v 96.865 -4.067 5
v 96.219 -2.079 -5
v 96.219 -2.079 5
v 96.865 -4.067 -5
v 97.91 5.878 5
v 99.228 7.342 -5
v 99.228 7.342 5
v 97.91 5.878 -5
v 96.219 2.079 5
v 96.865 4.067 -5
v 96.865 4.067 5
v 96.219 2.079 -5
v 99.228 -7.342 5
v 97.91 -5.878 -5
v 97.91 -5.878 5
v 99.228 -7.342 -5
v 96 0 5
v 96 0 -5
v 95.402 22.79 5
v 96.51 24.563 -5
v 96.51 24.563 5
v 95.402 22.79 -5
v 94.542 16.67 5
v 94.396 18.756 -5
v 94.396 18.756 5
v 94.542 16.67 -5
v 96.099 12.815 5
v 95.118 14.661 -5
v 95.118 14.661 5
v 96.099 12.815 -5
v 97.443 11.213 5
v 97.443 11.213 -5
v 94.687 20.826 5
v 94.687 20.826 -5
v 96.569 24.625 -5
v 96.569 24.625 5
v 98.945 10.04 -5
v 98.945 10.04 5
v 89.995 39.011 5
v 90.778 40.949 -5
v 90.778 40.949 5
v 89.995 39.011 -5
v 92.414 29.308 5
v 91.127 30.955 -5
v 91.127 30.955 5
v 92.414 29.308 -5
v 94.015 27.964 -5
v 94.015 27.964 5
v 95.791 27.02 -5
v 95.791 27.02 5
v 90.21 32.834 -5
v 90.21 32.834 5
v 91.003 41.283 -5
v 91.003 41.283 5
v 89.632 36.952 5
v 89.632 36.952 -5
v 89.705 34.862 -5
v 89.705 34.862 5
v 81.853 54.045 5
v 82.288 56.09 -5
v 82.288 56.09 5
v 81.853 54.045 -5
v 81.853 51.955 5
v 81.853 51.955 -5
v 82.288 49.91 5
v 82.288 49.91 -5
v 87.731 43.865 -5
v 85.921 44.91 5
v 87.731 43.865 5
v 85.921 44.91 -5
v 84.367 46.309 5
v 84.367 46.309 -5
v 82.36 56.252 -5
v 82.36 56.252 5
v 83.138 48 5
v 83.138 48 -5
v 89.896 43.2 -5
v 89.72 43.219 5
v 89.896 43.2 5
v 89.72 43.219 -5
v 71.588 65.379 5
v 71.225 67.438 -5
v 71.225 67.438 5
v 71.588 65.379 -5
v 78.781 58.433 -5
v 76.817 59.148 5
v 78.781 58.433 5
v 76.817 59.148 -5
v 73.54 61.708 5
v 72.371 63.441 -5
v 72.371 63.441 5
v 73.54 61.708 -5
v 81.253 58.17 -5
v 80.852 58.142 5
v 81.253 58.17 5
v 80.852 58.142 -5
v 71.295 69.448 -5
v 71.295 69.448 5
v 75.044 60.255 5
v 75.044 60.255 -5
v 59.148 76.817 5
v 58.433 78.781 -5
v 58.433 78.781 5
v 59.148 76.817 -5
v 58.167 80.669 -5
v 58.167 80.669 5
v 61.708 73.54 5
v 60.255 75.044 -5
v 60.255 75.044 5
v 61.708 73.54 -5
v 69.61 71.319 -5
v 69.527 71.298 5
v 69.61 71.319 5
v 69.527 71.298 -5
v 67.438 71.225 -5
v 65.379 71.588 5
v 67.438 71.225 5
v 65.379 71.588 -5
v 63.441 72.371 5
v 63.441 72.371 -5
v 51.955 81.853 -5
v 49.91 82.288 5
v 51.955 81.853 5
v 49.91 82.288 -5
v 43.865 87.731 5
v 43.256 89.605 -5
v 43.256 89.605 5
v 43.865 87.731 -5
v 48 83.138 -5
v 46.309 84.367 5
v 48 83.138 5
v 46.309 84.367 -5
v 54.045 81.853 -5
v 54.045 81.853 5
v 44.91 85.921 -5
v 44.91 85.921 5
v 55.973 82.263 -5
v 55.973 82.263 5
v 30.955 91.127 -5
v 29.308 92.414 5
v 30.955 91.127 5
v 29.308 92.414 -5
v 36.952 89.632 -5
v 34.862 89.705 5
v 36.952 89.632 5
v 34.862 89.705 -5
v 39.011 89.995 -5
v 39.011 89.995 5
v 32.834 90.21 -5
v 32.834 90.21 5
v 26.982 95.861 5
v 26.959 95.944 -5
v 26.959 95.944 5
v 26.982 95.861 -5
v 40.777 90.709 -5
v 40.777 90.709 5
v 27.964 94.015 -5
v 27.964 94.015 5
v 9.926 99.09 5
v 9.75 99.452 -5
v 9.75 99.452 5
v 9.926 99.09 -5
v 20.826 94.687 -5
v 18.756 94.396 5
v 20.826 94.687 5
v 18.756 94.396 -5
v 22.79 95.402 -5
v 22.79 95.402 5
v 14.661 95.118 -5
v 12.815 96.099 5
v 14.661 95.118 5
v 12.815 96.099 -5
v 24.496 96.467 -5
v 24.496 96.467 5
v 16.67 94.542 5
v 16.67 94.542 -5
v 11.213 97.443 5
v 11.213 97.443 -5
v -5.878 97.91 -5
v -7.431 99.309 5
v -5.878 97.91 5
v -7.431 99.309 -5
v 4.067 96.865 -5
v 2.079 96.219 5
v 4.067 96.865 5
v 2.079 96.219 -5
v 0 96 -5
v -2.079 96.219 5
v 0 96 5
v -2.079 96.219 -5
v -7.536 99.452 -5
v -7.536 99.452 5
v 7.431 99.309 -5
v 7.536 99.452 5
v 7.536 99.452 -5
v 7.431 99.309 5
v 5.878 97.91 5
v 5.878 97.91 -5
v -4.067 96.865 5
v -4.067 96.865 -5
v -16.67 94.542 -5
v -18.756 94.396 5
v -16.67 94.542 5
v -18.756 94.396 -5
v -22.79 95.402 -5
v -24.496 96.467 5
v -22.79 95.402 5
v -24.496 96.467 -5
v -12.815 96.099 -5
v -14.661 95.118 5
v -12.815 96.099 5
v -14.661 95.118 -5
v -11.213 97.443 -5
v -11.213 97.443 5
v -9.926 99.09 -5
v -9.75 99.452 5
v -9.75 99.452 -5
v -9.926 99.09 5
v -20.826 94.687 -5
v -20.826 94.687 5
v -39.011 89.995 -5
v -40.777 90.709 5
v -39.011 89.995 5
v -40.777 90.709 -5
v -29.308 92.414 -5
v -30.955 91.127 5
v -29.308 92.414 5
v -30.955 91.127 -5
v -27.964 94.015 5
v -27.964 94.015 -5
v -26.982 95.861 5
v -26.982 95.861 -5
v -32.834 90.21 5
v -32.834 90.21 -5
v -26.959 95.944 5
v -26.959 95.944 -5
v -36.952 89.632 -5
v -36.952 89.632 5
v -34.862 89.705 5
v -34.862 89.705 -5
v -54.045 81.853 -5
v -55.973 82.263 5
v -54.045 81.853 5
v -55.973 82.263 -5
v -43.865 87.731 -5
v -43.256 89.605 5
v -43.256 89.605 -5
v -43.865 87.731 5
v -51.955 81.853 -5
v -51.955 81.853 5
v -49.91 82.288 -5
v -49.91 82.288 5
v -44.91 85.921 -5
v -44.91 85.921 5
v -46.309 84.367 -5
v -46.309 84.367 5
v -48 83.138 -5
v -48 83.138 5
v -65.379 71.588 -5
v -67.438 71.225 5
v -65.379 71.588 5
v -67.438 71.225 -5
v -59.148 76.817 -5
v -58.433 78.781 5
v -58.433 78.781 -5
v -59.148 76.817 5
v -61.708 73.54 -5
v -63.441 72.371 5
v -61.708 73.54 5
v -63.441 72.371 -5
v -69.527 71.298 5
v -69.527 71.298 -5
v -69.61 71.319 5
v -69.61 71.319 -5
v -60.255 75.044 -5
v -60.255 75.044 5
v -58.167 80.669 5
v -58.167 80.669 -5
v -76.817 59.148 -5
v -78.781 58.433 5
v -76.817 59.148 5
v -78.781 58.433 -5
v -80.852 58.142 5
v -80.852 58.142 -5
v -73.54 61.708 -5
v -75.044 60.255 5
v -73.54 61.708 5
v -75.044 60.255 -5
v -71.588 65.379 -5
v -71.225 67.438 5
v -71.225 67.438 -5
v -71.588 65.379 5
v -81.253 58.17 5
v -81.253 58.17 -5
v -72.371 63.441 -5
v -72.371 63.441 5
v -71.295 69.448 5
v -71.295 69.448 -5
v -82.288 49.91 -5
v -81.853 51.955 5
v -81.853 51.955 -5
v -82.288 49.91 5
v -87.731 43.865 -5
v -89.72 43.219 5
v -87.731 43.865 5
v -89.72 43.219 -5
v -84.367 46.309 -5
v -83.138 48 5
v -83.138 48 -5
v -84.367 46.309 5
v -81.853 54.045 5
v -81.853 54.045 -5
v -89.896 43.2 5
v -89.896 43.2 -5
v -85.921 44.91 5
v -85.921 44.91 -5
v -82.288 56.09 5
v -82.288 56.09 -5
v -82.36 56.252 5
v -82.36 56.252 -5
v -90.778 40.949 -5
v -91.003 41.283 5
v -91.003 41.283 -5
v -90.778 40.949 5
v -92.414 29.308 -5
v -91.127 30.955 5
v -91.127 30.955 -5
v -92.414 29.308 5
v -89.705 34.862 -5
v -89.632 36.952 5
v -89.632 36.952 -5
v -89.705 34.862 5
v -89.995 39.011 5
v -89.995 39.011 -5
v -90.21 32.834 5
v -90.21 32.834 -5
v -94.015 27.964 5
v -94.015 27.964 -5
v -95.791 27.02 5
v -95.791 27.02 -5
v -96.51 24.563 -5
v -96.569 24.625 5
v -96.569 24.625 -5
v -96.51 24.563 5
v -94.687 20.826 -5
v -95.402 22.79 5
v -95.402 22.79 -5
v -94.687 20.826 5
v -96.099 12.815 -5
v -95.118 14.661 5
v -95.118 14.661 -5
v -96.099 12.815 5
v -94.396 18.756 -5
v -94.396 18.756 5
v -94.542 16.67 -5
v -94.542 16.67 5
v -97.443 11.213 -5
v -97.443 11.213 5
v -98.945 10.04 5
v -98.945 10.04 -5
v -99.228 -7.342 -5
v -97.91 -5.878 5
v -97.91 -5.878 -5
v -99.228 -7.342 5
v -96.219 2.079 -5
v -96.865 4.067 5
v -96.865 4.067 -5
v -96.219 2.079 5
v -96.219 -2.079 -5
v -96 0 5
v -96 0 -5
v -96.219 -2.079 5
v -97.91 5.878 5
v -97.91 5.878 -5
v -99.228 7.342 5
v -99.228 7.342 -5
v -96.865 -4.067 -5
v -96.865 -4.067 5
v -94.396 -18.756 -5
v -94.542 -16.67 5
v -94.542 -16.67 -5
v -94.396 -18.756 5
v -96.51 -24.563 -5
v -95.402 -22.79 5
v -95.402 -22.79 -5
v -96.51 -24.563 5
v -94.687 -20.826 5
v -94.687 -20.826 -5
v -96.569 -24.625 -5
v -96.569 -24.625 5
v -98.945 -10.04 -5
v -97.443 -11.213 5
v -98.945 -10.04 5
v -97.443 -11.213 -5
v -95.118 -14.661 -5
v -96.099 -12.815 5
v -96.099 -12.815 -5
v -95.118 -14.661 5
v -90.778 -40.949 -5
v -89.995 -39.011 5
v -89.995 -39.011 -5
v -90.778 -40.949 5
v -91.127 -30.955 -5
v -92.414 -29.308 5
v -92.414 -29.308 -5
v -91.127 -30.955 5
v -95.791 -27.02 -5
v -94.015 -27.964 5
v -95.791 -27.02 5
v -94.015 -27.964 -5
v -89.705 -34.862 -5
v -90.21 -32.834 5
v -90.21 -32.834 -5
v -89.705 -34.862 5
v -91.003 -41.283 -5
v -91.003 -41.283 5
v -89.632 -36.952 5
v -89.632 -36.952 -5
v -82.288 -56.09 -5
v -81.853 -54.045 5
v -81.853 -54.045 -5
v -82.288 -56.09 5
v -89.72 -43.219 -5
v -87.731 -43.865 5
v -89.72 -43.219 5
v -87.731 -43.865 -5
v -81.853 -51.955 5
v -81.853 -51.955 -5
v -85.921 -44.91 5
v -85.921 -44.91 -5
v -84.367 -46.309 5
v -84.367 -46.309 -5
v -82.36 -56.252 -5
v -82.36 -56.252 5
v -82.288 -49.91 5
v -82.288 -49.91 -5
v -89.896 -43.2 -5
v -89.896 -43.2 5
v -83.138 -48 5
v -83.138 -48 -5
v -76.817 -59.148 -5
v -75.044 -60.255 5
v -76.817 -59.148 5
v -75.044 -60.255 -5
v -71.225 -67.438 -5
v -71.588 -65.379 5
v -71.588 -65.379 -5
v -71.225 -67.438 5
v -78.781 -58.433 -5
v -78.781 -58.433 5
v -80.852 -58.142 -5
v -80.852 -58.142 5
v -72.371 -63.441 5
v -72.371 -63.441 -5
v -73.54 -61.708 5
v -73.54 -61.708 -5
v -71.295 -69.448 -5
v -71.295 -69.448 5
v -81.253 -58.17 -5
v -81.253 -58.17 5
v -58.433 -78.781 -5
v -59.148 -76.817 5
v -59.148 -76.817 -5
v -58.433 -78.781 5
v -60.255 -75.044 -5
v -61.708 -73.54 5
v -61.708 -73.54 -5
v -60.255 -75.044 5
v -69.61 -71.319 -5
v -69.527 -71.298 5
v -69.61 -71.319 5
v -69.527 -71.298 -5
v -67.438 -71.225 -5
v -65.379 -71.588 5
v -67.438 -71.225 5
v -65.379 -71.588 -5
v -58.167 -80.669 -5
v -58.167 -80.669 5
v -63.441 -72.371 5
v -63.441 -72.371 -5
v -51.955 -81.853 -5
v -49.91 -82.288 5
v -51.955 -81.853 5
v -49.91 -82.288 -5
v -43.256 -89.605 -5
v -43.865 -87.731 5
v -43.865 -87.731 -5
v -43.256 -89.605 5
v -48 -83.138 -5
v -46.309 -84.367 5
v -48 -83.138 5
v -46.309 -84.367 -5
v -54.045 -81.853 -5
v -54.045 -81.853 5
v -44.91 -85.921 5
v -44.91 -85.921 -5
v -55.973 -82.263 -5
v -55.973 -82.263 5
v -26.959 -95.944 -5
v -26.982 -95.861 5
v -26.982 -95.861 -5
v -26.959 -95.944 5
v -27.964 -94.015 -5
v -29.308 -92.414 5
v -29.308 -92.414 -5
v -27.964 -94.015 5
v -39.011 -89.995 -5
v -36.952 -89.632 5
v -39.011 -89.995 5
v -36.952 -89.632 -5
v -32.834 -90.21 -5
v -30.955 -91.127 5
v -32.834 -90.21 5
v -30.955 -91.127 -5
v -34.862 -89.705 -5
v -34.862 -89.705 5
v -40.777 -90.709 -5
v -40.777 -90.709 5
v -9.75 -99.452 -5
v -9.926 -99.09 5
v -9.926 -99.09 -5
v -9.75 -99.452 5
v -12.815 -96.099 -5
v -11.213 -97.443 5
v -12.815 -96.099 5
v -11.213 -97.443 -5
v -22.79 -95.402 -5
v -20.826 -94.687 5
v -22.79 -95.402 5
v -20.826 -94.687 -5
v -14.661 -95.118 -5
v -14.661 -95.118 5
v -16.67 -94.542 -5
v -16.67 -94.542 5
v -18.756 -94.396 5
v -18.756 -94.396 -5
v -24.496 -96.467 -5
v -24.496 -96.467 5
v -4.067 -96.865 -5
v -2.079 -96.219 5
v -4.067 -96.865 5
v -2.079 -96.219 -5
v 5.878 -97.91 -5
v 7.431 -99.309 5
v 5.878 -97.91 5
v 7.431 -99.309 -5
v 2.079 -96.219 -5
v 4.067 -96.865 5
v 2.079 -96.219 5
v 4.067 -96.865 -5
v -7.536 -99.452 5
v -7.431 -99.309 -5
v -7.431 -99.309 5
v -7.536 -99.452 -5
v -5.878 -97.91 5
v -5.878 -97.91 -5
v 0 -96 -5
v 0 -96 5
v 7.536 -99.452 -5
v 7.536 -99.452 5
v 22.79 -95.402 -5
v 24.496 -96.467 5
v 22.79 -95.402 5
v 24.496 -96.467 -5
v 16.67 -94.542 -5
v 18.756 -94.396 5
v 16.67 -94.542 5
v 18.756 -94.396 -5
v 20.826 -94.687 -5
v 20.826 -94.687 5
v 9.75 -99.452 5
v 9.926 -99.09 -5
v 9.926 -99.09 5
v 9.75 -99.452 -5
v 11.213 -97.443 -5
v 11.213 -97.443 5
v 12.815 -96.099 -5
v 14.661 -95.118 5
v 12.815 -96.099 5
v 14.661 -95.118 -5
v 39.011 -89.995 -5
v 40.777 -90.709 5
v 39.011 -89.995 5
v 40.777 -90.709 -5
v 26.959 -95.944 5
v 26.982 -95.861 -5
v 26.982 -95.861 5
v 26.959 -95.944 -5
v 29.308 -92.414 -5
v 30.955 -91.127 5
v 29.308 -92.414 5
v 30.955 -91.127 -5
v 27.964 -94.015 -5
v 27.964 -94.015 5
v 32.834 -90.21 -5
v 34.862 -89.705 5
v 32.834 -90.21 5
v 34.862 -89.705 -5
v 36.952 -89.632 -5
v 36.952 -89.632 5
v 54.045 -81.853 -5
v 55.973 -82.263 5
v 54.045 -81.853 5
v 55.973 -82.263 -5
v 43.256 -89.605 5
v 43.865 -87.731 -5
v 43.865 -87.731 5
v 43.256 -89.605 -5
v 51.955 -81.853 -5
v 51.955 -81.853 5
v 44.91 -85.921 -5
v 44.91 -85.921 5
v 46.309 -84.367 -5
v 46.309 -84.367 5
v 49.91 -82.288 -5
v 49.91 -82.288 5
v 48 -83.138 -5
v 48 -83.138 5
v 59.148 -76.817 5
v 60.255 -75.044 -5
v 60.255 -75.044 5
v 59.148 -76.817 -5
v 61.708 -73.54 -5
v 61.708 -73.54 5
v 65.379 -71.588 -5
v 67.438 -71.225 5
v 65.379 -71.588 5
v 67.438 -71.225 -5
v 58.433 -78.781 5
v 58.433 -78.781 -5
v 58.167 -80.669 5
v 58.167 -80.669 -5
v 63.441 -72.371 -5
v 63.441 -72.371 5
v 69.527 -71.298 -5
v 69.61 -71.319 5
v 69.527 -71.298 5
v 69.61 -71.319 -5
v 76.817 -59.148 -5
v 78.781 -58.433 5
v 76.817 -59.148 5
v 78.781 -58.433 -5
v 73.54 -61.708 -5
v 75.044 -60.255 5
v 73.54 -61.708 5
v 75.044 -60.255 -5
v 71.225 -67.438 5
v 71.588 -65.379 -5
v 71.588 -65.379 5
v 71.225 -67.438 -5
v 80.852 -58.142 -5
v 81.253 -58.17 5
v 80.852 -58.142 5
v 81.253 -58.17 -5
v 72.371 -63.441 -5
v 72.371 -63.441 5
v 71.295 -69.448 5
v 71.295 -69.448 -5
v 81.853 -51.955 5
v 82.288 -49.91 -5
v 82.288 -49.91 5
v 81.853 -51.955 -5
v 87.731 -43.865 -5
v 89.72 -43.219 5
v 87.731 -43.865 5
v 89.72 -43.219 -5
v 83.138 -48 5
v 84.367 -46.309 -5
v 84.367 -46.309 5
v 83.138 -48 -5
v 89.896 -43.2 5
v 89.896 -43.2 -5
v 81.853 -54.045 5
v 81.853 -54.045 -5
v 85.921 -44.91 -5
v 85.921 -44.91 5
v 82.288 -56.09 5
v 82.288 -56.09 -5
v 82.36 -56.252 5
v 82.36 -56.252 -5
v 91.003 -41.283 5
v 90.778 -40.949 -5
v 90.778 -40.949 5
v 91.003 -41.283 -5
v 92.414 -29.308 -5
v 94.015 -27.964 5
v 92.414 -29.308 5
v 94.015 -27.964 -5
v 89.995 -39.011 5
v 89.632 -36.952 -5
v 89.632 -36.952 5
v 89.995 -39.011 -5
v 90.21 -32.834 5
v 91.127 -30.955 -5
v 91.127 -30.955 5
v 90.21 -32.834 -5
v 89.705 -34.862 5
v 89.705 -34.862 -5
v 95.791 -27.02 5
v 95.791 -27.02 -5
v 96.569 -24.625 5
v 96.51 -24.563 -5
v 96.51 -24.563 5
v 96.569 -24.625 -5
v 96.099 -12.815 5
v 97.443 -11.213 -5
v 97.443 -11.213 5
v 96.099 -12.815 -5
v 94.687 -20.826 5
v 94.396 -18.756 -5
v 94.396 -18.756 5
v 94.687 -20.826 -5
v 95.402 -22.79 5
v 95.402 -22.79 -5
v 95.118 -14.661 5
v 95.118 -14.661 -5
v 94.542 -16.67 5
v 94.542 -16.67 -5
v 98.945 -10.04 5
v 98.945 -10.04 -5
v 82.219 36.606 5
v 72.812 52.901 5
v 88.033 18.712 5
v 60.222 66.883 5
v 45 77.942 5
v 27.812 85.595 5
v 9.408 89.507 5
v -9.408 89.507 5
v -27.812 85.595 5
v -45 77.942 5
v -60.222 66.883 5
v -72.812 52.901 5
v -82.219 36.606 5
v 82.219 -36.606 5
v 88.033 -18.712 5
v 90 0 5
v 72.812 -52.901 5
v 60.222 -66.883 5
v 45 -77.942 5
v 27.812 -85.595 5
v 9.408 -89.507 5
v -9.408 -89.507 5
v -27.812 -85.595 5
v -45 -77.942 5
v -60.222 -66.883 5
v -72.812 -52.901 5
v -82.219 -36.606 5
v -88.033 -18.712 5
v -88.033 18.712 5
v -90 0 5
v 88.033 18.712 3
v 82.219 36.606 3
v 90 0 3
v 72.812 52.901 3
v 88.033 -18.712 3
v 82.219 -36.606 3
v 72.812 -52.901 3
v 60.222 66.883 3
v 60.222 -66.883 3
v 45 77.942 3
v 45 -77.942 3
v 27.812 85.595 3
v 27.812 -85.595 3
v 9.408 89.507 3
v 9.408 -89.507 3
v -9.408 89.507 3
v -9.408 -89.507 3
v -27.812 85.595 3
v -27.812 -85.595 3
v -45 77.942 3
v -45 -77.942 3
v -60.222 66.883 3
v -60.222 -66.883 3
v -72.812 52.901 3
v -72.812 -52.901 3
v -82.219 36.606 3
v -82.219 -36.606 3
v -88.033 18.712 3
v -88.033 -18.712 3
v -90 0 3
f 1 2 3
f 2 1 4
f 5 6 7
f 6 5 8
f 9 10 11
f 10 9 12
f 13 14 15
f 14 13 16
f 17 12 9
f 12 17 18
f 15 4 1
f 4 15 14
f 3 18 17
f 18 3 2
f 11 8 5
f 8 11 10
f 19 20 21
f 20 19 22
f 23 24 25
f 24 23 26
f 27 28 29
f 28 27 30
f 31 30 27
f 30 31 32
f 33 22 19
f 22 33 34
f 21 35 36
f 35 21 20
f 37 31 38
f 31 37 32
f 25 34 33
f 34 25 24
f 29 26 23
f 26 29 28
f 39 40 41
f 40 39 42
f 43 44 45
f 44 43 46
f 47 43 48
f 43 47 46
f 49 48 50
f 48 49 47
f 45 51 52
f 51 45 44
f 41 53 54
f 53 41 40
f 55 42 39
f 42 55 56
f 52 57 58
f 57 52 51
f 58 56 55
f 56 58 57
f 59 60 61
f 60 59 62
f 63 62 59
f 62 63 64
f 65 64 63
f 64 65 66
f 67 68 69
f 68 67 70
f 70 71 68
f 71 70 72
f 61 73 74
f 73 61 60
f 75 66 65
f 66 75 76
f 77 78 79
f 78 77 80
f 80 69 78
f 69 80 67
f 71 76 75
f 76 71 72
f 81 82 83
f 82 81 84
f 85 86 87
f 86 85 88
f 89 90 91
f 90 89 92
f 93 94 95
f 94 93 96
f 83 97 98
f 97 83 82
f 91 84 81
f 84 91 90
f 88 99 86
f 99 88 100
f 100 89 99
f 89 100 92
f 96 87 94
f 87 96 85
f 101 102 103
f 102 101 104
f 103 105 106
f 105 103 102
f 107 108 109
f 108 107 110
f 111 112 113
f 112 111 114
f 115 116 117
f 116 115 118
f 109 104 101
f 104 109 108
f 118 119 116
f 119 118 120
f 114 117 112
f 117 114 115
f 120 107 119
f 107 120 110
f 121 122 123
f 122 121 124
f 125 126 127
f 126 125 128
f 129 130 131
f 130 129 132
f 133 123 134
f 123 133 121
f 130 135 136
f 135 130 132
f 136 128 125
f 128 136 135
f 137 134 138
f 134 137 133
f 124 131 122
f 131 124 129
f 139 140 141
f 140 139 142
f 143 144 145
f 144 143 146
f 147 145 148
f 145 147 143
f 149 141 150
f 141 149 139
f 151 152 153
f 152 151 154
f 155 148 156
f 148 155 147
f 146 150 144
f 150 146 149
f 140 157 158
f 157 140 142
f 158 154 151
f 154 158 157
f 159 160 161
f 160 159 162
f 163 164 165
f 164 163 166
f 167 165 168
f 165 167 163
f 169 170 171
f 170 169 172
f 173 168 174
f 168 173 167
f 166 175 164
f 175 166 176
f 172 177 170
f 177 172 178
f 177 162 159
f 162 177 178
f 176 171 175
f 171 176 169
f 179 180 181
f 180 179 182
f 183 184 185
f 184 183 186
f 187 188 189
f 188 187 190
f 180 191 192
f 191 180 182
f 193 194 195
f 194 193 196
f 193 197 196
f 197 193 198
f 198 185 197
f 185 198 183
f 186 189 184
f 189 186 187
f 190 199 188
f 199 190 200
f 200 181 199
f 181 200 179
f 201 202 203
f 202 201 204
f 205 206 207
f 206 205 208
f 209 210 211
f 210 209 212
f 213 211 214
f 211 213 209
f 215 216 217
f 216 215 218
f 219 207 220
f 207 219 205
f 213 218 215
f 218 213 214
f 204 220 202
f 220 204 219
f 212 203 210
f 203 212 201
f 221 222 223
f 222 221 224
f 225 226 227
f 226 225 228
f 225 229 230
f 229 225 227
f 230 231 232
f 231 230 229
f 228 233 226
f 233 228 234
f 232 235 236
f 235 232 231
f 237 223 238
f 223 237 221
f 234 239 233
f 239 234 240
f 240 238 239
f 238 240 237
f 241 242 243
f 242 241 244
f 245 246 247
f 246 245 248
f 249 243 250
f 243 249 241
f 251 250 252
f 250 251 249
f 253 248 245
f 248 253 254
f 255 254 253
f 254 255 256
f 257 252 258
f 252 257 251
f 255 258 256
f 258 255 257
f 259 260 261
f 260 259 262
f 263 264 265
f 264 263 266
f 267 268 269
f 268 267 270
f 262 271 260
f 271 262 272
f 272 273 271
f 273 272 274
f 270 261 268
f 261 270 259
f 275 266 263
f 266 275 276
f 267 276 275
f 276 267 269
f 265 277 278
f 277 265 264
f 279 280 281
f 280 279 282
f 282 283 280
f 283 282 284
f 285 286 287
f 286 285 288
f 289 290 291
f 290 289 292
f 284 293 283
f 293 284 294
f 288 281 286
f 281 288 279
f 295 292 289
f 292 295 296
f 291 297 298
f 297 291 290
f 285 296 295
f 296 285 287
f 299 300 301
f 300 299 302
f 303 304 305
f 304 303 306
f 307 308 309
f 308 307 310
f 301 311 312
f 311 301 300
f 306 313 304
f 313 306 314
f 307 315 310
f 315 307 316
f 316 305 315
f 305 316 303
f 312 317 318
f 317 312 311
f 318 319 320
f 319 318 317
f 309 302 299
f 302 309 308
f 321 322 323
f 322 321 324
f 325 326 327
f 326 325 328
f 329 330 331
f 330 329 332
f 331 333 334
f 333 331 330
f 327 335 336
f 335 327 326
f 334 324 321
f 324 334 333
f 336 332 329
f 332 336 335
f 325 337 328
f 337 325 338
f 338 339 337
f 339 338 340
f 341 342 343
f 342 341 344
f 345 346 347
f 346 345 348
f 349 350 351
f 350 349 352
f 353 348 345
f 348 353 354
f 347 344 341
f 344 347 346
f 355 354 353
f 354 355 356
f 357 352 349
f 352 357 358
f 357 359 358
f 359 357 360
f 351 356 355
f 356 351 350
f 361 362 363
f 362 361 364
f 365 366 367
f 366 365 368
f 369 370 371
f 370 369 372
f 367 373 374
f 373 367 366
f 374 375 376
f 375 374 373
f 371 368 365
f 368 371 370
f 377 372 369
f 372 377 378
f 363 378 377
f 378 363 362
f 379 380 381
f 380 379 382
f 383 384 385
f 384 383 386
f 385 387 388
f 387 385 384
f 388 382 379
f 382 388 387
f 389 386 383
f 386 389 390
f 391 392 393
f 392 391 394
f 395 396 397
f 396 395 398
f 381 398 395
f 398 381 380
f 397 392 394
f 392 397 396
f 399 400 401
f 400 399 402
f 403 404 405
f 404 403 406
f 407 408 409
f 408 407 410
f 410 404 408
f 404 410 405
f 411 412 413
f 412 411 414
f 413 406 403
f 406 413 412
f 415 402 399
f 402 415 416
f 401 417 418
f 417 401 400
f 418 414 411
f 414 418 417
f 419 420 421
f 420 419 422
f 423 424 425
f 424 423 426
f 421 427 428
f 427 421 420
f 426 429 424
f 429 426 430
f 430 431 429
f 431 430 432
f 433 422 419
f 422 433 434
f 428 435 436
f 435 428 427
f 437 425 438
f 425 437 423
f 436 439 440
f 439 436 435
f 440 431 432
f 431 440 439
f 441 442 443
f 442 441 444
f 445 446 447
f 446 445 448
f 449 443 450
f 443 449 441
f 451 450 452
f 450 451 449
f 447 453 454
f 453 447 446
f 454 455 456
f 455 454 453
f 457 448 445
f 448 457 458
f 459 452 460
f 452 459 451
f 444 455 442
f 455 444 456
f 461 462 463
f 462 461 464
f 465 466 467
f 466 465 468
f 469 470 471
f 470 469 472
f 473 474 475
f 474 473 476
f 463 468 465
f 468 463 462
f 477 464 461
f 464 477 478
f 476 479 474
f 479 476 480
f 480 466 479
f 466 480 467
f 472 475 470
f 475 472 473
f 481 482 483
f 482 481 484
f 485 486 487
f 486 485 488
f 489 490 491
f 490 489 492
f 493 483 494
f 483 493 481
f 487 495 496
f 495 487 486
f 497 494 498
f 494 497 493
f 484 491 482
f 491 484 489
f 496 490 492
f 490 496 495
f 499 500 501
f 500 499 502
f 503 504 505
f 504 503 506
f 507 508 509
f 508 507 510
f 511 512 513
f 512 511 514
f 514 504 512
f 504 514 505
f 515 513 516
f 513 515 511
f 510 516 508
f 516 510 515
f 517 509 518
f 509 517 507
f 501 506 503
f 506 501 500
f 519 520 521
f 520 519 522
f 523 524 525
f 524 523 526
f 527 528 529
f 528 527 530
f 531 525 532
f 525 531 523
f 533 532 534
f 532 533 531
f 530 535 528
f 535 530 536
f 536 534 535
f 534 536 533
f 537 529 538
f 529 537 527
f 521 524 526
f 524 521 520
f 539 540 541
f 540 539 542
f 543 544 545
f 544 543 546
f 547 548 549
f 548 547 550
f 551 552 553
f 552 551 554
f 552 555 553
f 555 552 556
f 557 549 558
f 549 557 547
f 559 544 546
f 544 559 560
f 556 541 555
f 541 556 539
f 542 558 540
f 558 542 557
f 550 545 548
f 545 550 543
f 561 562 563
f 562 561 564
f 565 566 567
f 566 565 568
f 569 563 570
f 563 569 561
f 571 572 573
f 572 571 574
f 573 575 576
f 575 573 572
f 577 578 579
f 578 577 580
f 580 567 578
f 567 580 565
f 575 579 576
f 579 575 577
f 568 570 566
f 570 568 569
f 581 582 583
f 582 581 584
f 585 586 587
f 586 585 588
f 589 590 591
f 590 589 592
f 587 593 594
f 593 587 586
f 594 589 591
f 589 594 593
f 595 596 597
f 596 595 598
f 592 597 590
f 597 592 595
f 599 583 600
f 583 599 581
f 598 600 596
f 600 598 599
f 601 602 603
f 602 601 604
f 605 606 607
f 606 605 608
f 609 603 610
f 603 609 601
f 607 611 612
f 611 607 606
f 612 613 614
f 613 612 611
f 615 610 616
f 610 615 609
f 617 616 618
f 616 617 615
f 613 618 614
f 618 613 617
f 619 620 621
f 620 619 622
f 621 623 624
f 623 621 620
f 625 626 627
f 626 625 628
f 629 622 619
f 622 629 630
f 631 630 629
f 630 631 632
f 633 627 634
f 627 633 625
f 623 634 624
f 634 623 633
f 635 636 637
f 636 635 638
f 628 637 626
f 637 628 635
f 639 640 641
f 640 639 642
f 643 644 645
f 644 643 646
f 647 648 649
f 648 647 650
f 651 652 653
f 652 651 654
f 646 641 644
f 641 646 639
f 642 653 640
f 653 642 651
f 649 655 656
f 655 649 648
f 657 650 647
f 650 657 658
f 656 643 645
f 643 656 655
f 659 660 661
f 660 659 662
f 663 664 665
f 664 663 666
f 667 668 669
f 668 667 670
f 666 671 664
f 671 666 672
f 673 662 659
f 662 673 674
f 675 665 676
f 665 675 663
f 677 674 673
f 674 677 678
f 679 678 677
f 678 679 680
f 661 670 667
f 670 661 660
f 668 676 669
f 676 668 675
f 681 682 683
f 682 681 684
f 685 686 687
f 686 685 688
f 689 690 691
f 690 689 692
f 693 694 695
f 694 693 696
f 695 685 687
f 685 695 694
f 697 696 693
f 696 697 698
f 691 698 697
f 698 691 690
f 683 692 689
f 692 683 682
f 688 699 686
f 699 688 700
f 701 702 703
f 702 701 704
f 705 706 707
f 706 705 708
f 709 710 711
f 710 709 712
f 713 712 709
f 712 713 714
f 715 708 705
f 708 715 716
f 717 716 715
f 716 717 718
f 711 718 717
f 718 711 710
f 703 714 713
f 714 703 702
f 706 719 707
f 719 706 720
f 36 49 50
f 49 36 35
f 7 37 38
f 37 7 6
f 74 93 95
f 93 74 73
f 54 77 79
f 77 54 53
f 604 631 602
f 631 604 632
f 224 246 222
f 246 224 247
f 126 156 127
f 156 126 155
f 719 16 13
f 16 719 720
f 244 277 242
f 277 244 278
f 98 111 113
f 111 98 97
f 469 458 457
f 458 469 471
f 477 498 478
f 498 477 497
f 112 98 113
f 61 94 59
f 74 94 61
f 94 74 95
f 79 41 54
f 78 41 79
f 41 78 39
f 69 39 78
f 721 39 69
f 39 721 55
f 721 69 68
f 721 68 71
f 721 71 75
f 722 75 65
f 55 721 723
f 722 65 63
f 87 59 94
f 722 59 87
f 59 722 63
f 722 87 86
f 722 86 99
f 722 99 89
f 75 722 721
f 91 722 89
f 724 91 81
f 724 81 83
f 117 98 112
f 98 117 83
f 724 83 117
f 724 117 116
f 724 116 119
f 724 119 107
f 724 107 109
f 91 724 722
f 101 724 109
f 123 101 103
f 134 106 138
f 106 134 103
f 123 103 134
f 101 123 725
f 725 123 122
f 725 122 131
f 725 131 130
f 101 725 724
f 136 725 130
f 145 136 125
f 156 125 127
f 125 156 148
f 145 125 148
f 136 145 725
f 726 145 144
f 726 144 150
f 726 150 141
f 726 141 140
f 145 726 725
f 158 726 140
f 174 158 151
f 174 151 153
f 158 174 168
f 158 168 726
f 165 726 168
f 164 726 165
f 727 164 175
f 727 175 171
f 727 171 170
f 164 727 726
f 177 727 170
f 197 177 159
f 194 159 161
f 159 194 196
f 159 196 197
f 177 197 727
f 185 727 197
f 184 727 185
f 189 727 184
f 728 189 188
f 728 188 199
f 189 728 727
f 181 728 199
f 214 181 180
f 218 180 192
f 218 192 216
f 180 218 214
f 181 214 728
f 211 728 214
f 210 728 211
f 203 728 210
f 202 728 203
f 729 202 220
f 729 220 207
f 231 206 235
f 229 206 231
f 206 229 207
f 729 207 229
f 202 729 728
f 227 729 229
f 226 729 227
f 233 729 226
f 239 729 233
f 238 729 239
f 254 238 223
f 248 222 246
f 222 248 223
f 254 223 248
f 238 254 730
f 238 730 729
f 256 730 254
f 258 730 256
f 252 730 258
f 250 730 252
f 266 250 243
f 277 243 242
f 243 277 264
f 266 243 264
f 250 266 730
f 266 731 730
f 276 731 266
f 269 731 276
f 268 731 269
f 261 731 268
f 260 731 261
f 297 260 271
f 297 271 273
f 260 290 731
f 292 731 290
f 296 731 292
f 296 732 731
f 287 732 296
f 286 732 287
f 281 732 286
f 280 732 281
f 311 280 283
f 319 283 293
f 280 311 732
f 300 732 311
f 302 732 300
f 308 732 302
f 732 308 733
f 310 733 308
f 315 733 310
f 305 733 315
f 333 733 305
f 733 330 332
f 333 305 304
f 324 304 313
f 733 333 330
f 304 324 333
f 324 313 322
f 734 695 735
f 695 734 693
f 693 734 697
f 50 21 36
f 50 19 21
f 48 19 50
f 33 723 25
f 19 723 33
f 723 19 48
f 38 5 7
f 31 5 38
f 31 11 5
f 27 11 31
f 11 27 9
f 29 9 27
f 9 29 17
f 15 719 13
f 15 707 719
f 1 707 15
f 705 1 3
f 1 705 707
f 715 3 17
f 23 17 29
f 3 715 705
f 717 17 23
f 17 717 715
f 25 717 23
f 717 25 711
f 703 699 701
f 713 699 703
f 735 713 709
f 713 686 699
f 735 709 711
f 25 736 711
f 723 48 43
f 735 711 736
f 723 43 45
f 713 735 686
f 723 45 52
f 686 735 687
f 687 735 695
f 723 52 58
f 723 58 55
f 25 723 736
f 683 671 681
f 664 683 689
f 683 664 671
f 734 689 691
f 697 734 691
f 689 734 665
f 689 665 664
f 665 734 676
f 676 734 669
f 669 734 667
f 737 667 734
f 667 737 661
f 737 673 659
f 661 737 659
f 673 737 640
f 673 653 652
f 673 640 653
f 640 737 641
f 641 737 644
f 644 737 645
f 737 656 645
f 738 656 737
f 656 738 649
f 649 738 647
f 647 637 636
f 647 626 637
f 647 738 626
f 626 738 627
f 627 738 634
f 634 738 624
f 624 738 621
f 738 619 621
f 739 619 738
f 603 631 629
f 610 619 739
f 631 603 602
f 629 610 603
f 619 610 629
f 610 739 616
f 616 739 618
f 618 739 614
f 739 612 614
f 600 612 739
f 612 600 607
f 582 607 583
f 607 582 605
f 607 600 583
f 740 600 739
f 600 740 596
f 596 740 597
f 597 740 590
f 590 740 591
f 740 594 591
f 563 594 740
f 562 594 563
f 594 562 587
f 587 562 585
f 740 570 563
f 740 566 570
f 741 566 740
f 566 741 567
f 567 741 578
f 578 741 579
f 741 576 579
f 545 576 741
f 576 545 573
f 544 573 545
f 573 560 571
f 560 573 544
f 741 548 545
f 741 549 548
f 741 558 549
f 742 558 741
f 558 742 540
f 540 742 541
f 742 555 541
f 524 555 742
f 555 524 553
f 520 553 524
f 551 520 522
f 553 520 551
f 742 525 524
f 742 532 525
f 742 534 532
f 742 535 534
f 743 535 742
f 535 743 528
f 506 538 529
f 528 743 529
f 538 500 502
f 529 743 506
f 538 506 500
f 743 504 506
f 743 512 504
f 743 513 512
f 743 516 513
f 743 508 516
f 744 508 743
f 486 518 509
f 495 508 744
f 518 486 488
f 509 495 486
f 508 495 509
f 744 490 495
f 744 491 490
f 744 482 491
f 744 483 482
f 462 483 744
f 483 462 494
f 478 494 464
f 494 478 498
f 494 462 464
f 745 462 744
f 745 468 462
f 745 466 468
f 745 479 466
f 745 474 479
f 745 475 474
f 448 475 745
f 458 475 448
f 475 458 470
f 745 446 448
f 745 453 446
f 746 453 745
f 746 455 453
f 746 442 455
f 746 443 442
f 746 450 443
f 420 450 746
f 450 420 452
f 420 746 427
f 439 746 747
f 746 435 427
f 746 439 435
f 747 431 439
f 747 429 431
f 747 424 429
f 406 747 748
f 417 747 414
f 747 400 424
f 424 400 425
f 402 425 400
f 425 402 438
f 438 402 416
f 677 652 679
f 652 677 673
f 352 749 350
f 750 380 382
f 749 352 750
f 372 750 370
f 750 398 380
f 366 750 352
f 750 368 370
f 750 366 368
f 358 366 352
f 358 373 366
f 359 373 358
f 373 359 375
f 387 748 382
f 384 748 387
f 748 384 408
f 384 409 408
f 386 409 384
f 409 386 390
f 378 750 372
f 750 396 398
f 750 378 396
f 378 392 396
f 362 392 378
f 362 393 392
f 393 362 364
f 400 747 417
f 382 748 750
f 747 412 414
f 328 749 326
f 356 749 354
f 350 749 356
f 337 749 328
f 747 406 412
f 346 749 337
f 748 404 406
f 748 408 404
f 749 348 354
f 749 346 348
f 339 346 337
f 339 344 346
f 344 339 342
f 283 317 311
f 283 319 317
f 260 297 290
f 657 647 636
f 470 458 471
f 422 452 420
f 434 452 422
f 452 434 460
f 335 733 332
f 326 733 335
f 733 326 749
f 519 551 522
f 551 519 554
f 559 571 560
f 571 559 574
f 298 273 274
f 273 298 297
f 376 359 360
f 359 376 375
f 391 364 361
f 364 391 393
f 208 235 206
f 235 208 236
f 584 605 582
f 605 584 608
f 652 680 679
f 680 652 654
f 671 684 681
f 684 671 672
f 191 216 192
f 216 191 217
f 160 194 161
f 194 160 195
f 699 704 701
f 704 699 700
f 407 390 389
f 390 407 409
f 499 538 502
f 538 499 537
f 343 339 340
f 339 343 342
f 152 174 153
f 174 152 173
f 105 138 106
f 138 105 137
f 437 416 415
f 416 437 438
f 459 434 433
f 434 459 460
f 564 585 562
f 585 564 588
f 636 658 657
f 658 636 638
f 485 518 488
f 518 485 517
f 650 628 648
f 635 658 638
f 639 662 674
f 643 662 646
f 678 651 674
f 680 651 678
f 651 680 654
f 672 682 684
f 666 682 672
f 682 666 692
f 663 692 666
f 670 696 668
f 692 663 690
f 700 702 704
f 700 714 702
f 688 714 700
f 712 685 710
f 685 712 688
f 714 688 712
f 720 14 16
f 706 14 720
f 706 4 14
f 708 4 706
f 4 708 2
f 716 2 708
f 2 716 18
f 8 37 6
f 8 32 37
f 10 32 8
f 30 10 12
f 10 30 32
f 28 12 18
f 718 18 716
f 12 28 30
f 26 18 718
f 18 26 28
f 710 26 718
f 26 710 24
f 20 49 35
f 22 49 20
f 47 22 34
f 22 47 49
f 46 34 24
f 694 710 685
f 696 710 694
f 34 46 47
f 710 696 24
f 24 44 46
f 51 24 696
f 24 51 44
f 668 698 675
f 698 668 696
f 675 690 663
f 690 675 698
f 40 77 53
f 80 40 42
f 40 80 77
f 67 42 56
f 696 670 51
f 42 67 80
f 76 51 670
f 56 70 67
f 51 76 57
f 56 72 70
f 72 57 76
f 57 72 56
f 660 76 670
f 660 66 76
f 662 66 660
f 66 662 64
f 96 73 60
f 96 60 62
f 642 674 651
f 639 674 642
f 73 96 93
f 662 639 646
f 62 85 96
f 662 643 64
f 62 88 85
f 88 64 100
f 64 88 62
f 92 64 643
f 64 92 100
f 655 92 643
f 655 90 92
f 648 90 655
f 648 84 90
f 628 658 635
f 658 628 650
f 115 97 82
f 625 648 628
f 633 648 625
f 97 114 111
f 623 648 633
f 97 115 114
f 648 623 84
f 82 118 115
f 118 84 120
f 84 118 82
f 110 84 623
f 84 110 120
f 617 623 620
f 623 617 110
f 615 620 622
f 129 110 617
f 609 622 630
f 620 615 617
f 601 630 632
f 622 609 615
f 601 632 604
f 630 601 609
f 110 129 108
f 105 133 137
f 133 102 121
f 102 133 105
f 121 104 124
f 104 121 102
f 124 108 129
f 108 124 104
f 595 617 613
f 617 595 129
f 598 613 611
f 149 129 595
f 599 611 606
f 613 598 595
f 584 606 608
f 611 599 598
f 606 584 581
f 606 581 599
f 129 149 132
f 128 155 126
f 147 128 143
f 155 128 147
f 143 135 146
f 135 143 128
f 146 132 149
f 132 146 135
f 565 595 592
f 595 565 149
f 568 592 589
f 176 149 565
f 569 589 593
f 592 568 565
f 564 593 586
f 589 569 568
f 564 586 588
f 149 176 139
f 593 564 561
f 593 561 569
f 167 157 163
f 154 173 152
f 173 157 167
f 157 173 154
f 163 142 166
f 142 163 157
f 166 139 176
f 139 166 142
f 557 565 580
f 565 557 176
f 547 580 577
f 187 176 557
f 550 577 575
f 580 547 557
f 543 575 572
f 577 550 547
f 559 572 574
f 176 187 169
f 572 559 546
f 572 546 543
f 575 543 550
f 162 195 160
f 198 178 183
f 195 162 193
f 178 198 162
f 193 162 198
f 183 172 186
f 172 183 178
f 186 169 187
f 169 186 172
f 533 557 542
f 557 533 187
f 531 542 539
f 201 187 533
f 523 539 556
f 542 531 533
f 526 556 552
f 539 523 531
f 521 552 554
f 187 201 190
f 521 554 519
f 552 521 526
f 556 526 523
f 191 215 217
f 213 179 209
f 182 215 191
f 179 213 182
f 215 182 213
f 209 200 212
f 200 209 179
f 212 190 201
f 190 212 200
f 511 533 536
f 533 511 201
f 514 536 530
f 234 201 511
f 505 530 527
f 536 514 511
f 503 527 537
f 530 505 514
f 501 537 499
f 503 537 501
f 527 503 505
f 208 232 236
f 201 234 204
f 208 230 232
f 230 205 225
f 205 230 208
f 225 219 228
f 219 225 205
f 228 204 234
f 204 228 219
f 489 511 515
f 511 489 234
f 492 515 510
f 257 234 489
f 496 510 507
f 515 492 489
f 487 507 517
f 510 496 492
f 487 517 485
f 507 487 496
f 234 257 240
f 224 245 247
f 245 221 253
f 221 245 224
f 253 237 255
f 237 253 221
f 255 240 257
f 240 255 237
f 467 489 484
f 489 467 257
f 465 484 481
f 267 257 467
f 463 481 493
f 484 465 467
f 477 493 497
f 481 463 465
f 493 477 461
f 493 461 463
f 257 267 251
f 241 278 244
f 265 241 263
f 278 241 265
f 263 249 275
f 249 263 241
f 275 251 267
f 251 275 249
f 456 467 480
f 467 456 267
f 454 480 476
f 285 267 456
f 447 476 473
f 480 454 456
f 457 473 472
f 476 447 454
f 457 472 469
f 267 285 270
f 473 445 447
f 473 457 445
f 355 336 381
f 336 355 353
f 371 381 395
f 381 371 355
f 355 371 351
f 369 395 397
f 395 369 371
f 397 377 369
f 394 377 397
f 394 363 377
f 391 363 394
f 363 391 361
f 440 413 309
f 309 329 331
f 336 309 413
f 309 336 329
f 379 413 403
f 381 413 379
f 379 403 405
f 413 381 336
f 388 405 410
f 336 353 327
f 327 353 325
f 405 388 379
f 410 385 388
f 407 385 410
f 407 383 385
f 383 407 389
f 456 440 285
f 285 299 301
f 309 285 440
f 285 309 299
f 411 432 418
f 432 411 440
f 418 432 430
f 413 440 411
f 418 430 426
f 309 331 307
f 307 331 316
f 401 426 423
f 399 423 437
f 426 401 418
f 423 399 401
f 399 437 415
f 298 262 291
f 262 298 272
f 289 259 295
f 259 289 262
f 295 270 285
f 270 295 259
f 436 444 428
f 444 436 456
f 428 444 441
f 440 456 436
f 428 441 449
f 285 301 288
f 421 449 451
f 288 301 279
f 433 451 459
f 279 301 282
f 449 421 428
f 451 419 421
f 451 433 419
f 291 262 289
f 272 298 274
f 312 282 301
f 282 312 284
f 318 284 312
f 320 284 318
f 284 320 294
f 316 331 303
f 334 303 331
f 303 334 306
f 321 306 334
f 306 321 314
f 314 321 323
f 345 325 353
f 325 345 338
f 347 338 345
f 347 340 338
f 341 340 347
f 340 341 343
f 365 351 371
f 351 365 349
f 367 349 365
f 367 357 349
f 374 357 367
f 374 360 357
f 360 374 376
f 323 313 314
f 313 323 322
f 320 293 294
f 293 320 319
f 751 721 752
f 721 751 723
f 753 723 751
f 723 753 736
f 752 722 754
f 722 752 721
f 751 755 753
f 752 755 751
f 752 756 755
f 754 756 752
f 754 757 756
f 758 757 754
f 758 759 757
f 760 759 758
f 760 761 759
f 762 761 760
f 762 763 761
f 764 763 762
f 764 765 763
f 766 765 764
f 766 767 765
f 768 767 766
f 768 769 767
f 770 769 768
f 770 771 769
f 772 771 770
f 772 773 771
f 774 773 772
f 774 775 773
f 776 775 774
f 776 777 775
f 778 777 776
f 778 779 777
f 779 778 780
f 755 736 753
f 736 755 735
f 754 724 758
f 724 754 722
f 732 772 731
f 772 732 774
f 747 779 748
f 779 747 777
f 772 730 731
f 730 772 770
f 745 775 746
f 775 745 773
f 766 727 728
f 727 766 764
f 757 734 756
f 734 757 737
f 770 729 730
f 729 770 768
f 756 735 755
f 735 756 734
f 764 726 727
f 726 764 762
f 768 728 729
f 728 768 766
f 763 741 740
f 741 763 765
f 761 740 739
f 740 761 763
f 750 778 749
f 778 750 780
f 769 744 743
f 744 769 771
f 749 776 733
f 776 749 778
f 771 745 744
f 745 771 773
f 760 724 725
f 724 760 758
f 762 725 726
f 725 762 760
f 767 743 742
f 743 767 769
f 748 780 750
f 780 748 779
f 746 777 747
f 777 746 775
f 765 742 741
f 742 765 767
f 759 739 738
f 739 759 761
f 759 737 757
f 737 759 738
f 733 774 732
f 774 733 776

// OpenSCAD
difference() {
  cylinder(r=100, h=10, center=true);
  translate([0, 0, 8]) {
    cylinder(r=90, h=10, center=true);
  }
  for (angle=[0:10:350]) {
    rotate(angle) {
      translate([106, 0, 0]) {
        cylinder(r=10, h=12, center=true);
      }
    }    
  }  
}
